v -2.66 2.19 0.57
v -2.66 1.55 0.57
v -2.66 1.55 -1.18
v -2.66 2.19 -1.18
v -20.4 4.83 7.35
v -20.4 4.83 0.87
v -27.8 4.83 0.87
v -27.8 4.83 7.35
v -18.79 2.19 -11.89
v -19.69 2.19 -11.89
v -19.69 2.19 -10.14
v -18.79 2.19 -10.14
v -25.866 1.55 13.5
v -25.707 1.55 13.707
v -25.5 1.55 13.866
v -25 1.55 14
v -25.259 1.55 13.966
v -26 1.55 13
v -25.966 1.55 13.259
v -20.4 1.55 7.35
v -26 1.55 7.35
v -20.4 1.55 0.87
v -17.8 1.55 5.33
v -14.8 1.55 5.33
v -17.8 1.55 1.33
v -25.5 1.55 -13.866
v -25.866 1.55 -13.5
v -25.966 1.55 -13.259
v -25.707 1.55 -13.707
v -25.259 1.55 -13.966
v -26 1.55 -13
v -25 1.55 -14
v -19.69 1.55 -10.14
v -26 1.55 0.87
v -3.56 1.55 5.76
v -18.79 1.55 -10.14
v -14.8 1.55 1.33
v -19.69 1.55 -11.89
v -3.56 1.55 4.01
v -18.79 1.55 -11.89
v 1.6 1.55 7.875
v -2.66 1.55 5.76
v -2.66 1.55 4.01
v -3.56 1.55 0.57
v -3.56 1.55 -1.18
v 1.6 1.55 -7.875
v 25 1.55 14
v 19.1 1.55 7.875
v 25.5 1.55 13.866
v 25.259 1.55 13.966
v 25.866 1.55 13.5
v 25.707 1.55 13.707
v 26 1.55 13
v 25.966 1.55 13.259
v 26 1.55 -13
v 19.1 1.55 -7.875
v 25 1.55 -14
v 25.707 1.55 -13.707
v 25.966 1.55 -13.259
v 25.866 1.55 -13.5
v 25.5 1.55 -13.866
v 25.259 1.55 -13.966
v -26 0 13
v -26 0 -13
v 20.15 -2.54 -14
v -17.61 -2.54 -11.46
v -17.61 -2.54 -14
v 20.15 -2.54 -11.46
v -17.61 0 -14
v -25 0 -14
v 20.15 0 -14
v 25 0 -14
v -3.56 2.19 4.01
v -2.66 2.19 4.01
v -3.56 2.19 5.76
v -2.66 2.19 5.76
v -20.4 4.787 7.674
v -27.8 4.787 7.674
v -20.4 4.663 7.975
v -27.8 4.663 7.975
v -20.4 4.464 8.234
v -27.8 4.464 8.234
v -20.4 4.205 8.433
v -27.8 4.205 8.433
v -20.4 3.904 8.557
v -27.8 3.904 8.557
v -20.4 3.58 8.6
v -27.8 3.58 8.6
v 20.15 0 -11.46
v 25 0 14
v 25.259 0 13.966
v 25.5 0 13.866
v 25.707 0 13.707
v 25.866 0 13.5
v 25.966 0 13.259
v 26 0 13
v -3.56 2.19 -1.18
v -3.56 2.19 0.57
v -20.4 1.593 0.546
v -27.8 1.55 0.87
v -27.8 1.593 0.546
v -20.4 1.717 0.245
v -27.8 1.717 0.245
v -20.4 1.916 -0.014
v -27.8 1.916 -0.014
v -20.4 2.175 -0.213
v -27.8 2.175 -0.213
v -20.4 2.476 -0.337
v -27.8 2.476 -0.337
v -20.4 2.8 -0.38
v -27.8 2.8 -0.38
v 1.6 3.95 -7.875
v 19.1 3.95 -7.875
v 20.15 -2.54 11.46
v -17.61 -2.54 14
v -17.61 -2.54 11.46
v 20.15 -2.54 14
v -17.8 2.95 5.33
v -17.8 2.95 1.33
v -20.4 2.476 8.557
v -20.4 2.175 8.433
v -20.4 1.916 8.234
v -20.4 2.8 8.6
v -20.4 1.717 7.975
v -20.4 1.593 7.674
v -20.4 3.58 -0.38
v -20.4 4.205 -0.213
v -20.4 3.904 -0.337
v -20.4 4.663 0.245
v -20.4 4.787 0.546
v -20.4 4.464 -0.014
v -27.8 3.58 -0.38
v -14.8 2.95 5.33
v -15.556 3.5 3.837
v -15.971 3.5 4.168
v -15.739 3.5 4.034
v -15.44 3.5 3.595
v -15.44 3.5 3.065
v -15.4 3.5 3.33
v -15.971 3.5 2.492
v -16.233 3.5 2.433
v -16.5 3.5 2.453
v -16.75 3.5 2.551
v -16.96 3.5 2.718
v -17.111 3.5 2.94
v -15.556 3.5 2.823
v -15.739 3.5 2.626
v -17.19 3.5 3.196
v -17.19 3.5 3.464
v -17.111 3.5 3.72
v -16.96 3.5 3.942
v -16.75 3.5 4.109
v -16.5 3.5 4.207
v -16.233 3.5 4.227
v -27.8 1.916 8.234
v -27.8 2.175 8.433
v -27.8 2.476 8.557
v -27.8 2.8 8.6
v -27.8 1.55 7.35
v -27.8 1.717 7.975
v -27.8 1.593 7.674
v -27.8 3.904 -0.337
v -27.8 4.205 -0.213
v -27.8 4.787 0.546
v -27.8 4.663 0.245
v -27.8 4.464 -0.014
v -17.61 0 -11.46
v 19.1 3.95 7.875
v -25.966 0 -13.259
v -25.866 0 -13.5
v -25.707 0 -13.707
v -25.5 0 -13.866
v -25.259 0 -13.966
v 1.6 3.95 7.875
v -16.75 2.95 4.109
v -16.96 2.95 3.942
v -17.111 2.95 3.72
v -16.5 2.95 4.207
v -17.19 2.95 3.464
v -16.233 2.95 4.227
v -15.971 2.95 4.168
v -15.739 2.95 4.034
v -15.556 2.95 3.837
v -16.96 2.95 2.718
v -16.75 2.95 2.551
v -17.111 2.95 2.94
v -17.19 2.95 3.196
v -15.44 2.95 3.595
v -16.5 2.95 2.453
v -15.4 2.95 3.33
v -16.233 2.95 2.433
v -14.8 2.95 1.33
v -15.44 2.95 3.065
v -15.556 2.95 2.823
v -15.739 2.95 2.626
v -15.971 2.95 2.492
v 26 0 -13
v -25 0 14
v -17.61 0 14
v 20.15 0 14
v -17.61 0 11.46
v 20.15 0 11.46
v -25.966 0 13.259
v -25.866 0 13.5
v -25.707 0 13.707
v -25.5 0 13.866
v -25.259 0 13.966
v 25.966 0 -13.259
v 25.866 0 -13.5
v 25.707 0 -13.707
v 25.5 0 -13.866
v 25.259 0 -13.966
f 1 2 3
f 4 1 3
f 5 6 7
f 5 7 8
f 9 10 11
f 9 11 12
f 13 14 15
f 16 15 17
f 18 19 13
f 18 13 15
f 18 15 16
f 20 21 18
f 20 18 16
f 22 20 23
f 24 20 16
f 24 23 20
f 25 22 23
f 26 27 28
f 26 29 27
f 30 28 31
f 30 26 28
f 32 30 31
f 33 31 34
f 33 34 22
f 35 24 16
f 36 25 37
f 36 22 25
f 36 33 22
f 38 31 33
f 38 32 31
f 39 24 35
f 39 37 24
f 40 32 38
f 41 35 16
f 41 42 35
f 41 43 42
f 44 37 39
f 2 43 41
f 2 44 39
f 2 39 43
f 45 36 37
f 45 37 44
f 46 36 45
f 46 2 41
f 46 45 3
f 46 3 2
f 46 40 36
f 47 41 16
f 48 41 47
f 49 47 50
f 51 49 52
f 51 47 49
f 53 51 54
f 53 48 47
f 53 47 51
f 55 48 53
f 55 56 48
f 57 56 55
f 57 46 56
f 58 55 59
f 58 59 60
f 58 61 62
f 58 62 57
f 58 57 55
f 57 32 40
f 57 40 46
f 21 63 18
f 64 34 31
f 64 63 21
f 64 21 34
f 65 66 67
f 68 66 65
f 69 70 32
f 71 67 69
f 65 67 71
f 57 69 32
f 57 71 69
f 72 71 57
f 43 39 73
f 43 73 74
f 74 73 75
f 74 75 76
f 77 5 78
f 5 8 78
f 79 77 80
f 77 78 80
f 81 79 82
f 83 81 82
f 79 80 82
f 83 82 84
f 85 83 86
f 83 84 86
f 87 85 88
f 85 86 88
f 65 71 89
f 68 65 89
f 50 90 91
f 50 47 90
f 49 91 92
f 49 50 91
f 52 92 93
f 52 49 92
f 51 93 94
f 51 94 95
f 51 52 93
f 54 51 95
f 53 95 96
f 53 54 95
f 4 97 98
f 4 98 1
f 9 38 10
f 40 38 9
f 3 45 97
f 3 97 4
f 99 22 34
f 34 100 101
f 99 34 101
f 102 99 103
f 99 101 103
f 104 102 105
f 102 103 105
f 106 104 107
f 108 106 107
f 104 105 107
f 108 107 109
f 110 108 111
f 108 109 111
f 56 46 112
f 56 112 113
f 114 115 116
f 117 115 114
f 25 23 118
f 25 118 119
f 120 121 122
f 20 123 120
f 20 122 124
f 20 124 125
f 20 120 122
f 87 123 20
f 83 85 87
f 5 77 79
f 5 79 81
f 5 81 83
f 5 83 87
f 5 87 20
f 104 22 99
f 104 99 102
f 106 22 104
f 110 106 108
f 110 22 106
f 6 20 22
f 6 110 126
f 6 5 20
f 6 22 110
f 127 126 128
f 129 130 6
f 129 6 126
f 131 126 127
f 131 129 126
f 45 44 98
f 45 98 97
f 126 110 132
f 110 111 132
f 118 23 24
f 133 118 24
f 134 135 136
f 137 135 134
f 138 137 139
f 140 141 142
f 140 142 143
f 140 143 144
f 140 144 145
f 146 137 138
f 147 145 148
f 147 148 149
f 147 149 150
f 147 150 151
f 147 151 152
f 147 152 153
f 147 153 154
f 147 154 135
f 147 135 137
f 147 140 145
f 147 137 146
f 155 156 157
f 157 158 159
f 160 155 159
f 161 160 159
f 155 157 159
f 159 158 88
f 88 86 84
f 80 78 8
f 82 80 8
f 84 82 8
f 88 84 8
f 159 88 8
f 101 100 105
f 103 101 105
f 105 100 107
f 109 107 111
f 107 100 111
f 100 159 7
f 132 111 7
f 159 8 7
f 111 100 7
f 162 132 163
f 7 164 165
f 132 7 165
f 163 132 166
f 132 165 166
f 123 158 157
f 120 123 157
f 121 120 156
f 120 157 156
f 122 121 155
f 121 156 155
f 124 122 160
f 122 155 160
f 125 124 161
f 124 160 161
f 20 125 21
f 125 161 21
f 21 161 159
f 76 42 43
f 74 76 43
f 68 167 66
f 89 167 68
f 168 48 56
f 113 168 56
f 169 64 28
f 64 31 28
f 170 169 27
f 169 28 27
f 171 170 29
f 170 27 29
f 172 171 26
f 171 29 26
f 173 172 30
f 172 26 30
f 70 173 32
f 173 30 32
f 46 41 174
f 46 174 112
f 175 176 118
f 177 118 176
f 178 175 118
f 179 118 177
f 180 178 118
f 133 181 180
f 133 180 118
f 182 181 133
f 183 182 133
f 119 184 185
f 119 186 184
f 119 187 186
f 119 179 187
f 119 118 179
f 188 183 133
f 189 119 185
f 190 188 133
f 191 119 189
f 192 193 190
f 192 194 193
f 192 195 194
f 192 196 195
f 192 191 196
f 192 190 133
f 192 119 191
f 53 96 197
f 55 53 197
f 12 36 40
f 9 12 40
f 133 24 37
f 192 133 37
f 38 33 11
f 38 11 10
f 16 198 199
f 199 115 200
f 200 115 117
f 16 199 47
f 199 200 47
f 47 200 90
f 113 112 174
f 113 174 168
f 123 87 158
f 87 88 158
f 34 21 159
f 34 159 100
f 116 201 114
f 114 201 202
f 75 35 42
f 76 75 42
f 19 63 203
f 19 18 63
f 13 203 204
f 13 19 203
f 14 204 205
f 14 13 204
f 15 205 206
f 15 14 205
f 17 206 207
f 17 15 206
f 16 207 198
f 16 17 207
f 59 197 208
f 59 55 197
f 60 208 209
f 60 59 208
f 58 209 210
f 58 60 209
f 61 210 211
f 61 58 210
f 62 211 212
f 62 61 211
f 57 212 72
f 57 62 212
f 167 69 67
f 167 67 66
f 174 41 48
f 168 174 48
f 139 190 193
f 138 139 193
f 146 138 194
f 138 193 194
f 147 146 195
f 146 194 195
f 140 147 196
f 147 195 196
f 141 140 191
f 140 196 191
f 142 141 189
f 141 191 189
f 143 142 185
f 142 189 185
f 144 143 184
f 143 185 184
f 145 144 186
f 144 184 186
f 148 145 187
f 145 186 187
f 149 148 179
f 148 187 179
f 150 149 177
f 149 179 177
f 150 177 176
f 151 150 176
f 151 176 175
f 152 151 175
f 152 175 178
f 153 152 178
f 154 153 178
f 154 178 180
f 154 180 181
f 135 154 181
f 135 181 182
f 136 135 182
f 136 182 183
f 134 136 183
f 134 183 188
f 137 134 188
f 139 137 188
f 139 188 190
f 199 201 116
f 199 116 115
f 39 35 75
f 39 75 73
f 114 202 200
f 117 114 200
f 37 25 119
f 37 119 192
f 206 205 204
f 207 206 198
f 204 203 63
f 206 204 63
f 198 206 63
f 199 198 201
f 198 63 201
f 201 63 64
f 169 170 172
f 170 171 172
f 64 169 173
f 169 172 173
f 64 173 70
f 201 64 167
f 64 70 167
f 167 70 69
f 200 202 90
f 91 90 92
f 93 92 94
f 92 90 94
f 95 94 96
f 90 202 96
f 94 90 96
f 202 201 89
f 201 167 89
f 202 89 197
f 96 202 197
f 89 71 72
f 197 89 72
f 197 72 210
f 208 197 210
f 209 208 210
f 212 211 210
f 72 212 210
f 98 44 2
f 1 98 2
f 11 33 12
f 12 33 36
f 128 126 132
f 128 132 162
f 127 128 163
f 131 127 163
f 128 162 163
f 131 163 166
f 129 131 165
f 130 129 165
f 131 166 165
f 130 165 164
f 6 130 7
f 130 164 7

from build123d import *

# Parameters (mm, degrees)
SKETCH_1_W           = 52
SKETCH_1_H           = 28
EXTRUDE_1_DEPTH      = 1.55
FILLET_1_R           = 1
SKETCH_2_W           = 37.76
SKETCH_2_H           = 2.54
EXTRUDE_2_DEPTH      = 2.54
SKETCH_3_W           = 17.5
SKETCH_3_H           = 15.75
EXTRUDE_4_DEPTH      = 2.4
EXTRUDE_6_DEPTH      = 1.8
EXTRUDE_6_DEPTH_BACK = 5.6
SKETCH1_W            = 3
SKETCH1_H            = 4
BOSS_EXTRUDE1_DEPTH  = 1.4
SKETCH1_4_R          = 0.9
BOSS_EXTRUDE2_DEPTH  = 1.95
SKETCH2_W            = 0.9
SKETCH2_H            = 1.75
BOSS_EXTRUDE3_DEPTH  = 0.64


with BuildPart() as part:
    # 草圖1 → 填料-伸長1 (new body)
    with BuildSketch(Plane(origin=(0, 0, 0), x_dir=(1, 0, 0), z_dir=(0, 1, 0))):
        Rectangle(SKETCH_1_W, SKETCH_1_H)
    extrude(amount=EXTRUDE_1_DEPTH)

    # 圓角1
    fillet_1_edges = [part.edges().sort_by_distance(p)[0] for p in [
        (26, 0.775, -14),
        (-26, 0.775, -14),
        (-26, 0.775, 14),
        (26, 0.775, 14),
    ]]
    fillet(fillet_1_edges, radius=FILLET_1_R)

    # 草圖2 → 填料-伸長2 (add)
    with BuildSketch(Plane.XZ):
        with Locations((1.27, 12.73)):
            Rectangle(SKETCH_2_W, SKETCH_2_H)
        with Locations((1.27, -12.73)):
            Rectangle(SKETCH_2_W, SKETCH_2_H)
    extrude(amount=EXTRUDE_2_DEPTH)

    # 草圖3 → 填料-伸長4 (add)
    with BuildSketch(Plane(origin=(0, 1.55, 0), x_dir=(1, 0, 0), z_dir=(0, 1, 0))):
        with Locations((10.35, 0)):
            Rectangle(SKETCH_3_W, SKETCH_3_H)
    extrude(amount=EXTRUDE_4_DEPTH)

    # 草圖5 → 填料-伸長6 (add, two sides: drawn at the far end of the back side and taken through both)
    with BuildSketch(Plane.ZY.offset(26).offset(-EXTRUDE_6_DEPTH_BACK)):
        with BuildLine():
            Line((7.35, 1.55), (0.87, 1.55))
            ThreePointArc((0.87, 1.55), (-0.013883476, 1.916116524), (-0.38, 2.8))
            Line((-0.38, 2.8), (-0.38, 3.58))
            ThreePointArc((-0.38, 3.58), (-0.013883476, 4.463883476), (0.87, 4.83))
            Line((0.87, 4.83), (7.35, 4.83))
            ThreePointArc((7.35, 4.83), (8.233883476, 4.463883476), (8.6, 3.58))
            Line((8.6, 3.58), (8.6, 2.8))
            ThreePointArc((8.6, 2.8), (8.233883476, 1.916116524), (7.35, 1.55))
        make_face()
    extrude(amount=EXTRUDE_6_DEPTH + EXTRUDE_6_DEPTH_BACK)

    # Sketch1 → Boss-Extrude1 (add)
    with BuildSketch(Plane(origin=(0, 1.55, 0), x_dir=(1, 0, 0), z_dir=(0, 1, 0))):
        with Locations((-16.3, -3.33)):
            Rectangle(SKETCH1_W, SKETCH1_H)
    extrude(amount=BOSS_EXTRUDE1_DEPTH)

    # Sketch1<4> → Boss-Extrude2 (add)
    with BuildSketch(Plane(origin=(0, 1.55, 0), x_dir=(1, 0, 0), z_dir=(0, 1, 0))):
        with Locations((-16.3, -3.33)):
            Circle(SKETCH1_4_R)
    extrude(amount=BOSS_EXTRUDE2_DEPTH)

    # Sketch2 → Boss-Extrude3 (add)
    with BuildSketch(Plane(origin=(0, 1.55, 0), x_dir=(1, 0, 0), z_dir=(0, 1, 0))):
        with Locations((-19.24, 11.015)):
            Rectangle(SKETCH2_W, SKETCH2_H)
        with Locations((-3.11, 0.305)):
            Rectangle(SKETCH2_W, SKETCH2_H)
        with Locations((-3.11, -4.885)):
            Rectangle(SKETCH2_W, SKETCH2_H)
    extrude(amount=BOSS_EXTRUDE3_DEPTH)


solid = part.part
